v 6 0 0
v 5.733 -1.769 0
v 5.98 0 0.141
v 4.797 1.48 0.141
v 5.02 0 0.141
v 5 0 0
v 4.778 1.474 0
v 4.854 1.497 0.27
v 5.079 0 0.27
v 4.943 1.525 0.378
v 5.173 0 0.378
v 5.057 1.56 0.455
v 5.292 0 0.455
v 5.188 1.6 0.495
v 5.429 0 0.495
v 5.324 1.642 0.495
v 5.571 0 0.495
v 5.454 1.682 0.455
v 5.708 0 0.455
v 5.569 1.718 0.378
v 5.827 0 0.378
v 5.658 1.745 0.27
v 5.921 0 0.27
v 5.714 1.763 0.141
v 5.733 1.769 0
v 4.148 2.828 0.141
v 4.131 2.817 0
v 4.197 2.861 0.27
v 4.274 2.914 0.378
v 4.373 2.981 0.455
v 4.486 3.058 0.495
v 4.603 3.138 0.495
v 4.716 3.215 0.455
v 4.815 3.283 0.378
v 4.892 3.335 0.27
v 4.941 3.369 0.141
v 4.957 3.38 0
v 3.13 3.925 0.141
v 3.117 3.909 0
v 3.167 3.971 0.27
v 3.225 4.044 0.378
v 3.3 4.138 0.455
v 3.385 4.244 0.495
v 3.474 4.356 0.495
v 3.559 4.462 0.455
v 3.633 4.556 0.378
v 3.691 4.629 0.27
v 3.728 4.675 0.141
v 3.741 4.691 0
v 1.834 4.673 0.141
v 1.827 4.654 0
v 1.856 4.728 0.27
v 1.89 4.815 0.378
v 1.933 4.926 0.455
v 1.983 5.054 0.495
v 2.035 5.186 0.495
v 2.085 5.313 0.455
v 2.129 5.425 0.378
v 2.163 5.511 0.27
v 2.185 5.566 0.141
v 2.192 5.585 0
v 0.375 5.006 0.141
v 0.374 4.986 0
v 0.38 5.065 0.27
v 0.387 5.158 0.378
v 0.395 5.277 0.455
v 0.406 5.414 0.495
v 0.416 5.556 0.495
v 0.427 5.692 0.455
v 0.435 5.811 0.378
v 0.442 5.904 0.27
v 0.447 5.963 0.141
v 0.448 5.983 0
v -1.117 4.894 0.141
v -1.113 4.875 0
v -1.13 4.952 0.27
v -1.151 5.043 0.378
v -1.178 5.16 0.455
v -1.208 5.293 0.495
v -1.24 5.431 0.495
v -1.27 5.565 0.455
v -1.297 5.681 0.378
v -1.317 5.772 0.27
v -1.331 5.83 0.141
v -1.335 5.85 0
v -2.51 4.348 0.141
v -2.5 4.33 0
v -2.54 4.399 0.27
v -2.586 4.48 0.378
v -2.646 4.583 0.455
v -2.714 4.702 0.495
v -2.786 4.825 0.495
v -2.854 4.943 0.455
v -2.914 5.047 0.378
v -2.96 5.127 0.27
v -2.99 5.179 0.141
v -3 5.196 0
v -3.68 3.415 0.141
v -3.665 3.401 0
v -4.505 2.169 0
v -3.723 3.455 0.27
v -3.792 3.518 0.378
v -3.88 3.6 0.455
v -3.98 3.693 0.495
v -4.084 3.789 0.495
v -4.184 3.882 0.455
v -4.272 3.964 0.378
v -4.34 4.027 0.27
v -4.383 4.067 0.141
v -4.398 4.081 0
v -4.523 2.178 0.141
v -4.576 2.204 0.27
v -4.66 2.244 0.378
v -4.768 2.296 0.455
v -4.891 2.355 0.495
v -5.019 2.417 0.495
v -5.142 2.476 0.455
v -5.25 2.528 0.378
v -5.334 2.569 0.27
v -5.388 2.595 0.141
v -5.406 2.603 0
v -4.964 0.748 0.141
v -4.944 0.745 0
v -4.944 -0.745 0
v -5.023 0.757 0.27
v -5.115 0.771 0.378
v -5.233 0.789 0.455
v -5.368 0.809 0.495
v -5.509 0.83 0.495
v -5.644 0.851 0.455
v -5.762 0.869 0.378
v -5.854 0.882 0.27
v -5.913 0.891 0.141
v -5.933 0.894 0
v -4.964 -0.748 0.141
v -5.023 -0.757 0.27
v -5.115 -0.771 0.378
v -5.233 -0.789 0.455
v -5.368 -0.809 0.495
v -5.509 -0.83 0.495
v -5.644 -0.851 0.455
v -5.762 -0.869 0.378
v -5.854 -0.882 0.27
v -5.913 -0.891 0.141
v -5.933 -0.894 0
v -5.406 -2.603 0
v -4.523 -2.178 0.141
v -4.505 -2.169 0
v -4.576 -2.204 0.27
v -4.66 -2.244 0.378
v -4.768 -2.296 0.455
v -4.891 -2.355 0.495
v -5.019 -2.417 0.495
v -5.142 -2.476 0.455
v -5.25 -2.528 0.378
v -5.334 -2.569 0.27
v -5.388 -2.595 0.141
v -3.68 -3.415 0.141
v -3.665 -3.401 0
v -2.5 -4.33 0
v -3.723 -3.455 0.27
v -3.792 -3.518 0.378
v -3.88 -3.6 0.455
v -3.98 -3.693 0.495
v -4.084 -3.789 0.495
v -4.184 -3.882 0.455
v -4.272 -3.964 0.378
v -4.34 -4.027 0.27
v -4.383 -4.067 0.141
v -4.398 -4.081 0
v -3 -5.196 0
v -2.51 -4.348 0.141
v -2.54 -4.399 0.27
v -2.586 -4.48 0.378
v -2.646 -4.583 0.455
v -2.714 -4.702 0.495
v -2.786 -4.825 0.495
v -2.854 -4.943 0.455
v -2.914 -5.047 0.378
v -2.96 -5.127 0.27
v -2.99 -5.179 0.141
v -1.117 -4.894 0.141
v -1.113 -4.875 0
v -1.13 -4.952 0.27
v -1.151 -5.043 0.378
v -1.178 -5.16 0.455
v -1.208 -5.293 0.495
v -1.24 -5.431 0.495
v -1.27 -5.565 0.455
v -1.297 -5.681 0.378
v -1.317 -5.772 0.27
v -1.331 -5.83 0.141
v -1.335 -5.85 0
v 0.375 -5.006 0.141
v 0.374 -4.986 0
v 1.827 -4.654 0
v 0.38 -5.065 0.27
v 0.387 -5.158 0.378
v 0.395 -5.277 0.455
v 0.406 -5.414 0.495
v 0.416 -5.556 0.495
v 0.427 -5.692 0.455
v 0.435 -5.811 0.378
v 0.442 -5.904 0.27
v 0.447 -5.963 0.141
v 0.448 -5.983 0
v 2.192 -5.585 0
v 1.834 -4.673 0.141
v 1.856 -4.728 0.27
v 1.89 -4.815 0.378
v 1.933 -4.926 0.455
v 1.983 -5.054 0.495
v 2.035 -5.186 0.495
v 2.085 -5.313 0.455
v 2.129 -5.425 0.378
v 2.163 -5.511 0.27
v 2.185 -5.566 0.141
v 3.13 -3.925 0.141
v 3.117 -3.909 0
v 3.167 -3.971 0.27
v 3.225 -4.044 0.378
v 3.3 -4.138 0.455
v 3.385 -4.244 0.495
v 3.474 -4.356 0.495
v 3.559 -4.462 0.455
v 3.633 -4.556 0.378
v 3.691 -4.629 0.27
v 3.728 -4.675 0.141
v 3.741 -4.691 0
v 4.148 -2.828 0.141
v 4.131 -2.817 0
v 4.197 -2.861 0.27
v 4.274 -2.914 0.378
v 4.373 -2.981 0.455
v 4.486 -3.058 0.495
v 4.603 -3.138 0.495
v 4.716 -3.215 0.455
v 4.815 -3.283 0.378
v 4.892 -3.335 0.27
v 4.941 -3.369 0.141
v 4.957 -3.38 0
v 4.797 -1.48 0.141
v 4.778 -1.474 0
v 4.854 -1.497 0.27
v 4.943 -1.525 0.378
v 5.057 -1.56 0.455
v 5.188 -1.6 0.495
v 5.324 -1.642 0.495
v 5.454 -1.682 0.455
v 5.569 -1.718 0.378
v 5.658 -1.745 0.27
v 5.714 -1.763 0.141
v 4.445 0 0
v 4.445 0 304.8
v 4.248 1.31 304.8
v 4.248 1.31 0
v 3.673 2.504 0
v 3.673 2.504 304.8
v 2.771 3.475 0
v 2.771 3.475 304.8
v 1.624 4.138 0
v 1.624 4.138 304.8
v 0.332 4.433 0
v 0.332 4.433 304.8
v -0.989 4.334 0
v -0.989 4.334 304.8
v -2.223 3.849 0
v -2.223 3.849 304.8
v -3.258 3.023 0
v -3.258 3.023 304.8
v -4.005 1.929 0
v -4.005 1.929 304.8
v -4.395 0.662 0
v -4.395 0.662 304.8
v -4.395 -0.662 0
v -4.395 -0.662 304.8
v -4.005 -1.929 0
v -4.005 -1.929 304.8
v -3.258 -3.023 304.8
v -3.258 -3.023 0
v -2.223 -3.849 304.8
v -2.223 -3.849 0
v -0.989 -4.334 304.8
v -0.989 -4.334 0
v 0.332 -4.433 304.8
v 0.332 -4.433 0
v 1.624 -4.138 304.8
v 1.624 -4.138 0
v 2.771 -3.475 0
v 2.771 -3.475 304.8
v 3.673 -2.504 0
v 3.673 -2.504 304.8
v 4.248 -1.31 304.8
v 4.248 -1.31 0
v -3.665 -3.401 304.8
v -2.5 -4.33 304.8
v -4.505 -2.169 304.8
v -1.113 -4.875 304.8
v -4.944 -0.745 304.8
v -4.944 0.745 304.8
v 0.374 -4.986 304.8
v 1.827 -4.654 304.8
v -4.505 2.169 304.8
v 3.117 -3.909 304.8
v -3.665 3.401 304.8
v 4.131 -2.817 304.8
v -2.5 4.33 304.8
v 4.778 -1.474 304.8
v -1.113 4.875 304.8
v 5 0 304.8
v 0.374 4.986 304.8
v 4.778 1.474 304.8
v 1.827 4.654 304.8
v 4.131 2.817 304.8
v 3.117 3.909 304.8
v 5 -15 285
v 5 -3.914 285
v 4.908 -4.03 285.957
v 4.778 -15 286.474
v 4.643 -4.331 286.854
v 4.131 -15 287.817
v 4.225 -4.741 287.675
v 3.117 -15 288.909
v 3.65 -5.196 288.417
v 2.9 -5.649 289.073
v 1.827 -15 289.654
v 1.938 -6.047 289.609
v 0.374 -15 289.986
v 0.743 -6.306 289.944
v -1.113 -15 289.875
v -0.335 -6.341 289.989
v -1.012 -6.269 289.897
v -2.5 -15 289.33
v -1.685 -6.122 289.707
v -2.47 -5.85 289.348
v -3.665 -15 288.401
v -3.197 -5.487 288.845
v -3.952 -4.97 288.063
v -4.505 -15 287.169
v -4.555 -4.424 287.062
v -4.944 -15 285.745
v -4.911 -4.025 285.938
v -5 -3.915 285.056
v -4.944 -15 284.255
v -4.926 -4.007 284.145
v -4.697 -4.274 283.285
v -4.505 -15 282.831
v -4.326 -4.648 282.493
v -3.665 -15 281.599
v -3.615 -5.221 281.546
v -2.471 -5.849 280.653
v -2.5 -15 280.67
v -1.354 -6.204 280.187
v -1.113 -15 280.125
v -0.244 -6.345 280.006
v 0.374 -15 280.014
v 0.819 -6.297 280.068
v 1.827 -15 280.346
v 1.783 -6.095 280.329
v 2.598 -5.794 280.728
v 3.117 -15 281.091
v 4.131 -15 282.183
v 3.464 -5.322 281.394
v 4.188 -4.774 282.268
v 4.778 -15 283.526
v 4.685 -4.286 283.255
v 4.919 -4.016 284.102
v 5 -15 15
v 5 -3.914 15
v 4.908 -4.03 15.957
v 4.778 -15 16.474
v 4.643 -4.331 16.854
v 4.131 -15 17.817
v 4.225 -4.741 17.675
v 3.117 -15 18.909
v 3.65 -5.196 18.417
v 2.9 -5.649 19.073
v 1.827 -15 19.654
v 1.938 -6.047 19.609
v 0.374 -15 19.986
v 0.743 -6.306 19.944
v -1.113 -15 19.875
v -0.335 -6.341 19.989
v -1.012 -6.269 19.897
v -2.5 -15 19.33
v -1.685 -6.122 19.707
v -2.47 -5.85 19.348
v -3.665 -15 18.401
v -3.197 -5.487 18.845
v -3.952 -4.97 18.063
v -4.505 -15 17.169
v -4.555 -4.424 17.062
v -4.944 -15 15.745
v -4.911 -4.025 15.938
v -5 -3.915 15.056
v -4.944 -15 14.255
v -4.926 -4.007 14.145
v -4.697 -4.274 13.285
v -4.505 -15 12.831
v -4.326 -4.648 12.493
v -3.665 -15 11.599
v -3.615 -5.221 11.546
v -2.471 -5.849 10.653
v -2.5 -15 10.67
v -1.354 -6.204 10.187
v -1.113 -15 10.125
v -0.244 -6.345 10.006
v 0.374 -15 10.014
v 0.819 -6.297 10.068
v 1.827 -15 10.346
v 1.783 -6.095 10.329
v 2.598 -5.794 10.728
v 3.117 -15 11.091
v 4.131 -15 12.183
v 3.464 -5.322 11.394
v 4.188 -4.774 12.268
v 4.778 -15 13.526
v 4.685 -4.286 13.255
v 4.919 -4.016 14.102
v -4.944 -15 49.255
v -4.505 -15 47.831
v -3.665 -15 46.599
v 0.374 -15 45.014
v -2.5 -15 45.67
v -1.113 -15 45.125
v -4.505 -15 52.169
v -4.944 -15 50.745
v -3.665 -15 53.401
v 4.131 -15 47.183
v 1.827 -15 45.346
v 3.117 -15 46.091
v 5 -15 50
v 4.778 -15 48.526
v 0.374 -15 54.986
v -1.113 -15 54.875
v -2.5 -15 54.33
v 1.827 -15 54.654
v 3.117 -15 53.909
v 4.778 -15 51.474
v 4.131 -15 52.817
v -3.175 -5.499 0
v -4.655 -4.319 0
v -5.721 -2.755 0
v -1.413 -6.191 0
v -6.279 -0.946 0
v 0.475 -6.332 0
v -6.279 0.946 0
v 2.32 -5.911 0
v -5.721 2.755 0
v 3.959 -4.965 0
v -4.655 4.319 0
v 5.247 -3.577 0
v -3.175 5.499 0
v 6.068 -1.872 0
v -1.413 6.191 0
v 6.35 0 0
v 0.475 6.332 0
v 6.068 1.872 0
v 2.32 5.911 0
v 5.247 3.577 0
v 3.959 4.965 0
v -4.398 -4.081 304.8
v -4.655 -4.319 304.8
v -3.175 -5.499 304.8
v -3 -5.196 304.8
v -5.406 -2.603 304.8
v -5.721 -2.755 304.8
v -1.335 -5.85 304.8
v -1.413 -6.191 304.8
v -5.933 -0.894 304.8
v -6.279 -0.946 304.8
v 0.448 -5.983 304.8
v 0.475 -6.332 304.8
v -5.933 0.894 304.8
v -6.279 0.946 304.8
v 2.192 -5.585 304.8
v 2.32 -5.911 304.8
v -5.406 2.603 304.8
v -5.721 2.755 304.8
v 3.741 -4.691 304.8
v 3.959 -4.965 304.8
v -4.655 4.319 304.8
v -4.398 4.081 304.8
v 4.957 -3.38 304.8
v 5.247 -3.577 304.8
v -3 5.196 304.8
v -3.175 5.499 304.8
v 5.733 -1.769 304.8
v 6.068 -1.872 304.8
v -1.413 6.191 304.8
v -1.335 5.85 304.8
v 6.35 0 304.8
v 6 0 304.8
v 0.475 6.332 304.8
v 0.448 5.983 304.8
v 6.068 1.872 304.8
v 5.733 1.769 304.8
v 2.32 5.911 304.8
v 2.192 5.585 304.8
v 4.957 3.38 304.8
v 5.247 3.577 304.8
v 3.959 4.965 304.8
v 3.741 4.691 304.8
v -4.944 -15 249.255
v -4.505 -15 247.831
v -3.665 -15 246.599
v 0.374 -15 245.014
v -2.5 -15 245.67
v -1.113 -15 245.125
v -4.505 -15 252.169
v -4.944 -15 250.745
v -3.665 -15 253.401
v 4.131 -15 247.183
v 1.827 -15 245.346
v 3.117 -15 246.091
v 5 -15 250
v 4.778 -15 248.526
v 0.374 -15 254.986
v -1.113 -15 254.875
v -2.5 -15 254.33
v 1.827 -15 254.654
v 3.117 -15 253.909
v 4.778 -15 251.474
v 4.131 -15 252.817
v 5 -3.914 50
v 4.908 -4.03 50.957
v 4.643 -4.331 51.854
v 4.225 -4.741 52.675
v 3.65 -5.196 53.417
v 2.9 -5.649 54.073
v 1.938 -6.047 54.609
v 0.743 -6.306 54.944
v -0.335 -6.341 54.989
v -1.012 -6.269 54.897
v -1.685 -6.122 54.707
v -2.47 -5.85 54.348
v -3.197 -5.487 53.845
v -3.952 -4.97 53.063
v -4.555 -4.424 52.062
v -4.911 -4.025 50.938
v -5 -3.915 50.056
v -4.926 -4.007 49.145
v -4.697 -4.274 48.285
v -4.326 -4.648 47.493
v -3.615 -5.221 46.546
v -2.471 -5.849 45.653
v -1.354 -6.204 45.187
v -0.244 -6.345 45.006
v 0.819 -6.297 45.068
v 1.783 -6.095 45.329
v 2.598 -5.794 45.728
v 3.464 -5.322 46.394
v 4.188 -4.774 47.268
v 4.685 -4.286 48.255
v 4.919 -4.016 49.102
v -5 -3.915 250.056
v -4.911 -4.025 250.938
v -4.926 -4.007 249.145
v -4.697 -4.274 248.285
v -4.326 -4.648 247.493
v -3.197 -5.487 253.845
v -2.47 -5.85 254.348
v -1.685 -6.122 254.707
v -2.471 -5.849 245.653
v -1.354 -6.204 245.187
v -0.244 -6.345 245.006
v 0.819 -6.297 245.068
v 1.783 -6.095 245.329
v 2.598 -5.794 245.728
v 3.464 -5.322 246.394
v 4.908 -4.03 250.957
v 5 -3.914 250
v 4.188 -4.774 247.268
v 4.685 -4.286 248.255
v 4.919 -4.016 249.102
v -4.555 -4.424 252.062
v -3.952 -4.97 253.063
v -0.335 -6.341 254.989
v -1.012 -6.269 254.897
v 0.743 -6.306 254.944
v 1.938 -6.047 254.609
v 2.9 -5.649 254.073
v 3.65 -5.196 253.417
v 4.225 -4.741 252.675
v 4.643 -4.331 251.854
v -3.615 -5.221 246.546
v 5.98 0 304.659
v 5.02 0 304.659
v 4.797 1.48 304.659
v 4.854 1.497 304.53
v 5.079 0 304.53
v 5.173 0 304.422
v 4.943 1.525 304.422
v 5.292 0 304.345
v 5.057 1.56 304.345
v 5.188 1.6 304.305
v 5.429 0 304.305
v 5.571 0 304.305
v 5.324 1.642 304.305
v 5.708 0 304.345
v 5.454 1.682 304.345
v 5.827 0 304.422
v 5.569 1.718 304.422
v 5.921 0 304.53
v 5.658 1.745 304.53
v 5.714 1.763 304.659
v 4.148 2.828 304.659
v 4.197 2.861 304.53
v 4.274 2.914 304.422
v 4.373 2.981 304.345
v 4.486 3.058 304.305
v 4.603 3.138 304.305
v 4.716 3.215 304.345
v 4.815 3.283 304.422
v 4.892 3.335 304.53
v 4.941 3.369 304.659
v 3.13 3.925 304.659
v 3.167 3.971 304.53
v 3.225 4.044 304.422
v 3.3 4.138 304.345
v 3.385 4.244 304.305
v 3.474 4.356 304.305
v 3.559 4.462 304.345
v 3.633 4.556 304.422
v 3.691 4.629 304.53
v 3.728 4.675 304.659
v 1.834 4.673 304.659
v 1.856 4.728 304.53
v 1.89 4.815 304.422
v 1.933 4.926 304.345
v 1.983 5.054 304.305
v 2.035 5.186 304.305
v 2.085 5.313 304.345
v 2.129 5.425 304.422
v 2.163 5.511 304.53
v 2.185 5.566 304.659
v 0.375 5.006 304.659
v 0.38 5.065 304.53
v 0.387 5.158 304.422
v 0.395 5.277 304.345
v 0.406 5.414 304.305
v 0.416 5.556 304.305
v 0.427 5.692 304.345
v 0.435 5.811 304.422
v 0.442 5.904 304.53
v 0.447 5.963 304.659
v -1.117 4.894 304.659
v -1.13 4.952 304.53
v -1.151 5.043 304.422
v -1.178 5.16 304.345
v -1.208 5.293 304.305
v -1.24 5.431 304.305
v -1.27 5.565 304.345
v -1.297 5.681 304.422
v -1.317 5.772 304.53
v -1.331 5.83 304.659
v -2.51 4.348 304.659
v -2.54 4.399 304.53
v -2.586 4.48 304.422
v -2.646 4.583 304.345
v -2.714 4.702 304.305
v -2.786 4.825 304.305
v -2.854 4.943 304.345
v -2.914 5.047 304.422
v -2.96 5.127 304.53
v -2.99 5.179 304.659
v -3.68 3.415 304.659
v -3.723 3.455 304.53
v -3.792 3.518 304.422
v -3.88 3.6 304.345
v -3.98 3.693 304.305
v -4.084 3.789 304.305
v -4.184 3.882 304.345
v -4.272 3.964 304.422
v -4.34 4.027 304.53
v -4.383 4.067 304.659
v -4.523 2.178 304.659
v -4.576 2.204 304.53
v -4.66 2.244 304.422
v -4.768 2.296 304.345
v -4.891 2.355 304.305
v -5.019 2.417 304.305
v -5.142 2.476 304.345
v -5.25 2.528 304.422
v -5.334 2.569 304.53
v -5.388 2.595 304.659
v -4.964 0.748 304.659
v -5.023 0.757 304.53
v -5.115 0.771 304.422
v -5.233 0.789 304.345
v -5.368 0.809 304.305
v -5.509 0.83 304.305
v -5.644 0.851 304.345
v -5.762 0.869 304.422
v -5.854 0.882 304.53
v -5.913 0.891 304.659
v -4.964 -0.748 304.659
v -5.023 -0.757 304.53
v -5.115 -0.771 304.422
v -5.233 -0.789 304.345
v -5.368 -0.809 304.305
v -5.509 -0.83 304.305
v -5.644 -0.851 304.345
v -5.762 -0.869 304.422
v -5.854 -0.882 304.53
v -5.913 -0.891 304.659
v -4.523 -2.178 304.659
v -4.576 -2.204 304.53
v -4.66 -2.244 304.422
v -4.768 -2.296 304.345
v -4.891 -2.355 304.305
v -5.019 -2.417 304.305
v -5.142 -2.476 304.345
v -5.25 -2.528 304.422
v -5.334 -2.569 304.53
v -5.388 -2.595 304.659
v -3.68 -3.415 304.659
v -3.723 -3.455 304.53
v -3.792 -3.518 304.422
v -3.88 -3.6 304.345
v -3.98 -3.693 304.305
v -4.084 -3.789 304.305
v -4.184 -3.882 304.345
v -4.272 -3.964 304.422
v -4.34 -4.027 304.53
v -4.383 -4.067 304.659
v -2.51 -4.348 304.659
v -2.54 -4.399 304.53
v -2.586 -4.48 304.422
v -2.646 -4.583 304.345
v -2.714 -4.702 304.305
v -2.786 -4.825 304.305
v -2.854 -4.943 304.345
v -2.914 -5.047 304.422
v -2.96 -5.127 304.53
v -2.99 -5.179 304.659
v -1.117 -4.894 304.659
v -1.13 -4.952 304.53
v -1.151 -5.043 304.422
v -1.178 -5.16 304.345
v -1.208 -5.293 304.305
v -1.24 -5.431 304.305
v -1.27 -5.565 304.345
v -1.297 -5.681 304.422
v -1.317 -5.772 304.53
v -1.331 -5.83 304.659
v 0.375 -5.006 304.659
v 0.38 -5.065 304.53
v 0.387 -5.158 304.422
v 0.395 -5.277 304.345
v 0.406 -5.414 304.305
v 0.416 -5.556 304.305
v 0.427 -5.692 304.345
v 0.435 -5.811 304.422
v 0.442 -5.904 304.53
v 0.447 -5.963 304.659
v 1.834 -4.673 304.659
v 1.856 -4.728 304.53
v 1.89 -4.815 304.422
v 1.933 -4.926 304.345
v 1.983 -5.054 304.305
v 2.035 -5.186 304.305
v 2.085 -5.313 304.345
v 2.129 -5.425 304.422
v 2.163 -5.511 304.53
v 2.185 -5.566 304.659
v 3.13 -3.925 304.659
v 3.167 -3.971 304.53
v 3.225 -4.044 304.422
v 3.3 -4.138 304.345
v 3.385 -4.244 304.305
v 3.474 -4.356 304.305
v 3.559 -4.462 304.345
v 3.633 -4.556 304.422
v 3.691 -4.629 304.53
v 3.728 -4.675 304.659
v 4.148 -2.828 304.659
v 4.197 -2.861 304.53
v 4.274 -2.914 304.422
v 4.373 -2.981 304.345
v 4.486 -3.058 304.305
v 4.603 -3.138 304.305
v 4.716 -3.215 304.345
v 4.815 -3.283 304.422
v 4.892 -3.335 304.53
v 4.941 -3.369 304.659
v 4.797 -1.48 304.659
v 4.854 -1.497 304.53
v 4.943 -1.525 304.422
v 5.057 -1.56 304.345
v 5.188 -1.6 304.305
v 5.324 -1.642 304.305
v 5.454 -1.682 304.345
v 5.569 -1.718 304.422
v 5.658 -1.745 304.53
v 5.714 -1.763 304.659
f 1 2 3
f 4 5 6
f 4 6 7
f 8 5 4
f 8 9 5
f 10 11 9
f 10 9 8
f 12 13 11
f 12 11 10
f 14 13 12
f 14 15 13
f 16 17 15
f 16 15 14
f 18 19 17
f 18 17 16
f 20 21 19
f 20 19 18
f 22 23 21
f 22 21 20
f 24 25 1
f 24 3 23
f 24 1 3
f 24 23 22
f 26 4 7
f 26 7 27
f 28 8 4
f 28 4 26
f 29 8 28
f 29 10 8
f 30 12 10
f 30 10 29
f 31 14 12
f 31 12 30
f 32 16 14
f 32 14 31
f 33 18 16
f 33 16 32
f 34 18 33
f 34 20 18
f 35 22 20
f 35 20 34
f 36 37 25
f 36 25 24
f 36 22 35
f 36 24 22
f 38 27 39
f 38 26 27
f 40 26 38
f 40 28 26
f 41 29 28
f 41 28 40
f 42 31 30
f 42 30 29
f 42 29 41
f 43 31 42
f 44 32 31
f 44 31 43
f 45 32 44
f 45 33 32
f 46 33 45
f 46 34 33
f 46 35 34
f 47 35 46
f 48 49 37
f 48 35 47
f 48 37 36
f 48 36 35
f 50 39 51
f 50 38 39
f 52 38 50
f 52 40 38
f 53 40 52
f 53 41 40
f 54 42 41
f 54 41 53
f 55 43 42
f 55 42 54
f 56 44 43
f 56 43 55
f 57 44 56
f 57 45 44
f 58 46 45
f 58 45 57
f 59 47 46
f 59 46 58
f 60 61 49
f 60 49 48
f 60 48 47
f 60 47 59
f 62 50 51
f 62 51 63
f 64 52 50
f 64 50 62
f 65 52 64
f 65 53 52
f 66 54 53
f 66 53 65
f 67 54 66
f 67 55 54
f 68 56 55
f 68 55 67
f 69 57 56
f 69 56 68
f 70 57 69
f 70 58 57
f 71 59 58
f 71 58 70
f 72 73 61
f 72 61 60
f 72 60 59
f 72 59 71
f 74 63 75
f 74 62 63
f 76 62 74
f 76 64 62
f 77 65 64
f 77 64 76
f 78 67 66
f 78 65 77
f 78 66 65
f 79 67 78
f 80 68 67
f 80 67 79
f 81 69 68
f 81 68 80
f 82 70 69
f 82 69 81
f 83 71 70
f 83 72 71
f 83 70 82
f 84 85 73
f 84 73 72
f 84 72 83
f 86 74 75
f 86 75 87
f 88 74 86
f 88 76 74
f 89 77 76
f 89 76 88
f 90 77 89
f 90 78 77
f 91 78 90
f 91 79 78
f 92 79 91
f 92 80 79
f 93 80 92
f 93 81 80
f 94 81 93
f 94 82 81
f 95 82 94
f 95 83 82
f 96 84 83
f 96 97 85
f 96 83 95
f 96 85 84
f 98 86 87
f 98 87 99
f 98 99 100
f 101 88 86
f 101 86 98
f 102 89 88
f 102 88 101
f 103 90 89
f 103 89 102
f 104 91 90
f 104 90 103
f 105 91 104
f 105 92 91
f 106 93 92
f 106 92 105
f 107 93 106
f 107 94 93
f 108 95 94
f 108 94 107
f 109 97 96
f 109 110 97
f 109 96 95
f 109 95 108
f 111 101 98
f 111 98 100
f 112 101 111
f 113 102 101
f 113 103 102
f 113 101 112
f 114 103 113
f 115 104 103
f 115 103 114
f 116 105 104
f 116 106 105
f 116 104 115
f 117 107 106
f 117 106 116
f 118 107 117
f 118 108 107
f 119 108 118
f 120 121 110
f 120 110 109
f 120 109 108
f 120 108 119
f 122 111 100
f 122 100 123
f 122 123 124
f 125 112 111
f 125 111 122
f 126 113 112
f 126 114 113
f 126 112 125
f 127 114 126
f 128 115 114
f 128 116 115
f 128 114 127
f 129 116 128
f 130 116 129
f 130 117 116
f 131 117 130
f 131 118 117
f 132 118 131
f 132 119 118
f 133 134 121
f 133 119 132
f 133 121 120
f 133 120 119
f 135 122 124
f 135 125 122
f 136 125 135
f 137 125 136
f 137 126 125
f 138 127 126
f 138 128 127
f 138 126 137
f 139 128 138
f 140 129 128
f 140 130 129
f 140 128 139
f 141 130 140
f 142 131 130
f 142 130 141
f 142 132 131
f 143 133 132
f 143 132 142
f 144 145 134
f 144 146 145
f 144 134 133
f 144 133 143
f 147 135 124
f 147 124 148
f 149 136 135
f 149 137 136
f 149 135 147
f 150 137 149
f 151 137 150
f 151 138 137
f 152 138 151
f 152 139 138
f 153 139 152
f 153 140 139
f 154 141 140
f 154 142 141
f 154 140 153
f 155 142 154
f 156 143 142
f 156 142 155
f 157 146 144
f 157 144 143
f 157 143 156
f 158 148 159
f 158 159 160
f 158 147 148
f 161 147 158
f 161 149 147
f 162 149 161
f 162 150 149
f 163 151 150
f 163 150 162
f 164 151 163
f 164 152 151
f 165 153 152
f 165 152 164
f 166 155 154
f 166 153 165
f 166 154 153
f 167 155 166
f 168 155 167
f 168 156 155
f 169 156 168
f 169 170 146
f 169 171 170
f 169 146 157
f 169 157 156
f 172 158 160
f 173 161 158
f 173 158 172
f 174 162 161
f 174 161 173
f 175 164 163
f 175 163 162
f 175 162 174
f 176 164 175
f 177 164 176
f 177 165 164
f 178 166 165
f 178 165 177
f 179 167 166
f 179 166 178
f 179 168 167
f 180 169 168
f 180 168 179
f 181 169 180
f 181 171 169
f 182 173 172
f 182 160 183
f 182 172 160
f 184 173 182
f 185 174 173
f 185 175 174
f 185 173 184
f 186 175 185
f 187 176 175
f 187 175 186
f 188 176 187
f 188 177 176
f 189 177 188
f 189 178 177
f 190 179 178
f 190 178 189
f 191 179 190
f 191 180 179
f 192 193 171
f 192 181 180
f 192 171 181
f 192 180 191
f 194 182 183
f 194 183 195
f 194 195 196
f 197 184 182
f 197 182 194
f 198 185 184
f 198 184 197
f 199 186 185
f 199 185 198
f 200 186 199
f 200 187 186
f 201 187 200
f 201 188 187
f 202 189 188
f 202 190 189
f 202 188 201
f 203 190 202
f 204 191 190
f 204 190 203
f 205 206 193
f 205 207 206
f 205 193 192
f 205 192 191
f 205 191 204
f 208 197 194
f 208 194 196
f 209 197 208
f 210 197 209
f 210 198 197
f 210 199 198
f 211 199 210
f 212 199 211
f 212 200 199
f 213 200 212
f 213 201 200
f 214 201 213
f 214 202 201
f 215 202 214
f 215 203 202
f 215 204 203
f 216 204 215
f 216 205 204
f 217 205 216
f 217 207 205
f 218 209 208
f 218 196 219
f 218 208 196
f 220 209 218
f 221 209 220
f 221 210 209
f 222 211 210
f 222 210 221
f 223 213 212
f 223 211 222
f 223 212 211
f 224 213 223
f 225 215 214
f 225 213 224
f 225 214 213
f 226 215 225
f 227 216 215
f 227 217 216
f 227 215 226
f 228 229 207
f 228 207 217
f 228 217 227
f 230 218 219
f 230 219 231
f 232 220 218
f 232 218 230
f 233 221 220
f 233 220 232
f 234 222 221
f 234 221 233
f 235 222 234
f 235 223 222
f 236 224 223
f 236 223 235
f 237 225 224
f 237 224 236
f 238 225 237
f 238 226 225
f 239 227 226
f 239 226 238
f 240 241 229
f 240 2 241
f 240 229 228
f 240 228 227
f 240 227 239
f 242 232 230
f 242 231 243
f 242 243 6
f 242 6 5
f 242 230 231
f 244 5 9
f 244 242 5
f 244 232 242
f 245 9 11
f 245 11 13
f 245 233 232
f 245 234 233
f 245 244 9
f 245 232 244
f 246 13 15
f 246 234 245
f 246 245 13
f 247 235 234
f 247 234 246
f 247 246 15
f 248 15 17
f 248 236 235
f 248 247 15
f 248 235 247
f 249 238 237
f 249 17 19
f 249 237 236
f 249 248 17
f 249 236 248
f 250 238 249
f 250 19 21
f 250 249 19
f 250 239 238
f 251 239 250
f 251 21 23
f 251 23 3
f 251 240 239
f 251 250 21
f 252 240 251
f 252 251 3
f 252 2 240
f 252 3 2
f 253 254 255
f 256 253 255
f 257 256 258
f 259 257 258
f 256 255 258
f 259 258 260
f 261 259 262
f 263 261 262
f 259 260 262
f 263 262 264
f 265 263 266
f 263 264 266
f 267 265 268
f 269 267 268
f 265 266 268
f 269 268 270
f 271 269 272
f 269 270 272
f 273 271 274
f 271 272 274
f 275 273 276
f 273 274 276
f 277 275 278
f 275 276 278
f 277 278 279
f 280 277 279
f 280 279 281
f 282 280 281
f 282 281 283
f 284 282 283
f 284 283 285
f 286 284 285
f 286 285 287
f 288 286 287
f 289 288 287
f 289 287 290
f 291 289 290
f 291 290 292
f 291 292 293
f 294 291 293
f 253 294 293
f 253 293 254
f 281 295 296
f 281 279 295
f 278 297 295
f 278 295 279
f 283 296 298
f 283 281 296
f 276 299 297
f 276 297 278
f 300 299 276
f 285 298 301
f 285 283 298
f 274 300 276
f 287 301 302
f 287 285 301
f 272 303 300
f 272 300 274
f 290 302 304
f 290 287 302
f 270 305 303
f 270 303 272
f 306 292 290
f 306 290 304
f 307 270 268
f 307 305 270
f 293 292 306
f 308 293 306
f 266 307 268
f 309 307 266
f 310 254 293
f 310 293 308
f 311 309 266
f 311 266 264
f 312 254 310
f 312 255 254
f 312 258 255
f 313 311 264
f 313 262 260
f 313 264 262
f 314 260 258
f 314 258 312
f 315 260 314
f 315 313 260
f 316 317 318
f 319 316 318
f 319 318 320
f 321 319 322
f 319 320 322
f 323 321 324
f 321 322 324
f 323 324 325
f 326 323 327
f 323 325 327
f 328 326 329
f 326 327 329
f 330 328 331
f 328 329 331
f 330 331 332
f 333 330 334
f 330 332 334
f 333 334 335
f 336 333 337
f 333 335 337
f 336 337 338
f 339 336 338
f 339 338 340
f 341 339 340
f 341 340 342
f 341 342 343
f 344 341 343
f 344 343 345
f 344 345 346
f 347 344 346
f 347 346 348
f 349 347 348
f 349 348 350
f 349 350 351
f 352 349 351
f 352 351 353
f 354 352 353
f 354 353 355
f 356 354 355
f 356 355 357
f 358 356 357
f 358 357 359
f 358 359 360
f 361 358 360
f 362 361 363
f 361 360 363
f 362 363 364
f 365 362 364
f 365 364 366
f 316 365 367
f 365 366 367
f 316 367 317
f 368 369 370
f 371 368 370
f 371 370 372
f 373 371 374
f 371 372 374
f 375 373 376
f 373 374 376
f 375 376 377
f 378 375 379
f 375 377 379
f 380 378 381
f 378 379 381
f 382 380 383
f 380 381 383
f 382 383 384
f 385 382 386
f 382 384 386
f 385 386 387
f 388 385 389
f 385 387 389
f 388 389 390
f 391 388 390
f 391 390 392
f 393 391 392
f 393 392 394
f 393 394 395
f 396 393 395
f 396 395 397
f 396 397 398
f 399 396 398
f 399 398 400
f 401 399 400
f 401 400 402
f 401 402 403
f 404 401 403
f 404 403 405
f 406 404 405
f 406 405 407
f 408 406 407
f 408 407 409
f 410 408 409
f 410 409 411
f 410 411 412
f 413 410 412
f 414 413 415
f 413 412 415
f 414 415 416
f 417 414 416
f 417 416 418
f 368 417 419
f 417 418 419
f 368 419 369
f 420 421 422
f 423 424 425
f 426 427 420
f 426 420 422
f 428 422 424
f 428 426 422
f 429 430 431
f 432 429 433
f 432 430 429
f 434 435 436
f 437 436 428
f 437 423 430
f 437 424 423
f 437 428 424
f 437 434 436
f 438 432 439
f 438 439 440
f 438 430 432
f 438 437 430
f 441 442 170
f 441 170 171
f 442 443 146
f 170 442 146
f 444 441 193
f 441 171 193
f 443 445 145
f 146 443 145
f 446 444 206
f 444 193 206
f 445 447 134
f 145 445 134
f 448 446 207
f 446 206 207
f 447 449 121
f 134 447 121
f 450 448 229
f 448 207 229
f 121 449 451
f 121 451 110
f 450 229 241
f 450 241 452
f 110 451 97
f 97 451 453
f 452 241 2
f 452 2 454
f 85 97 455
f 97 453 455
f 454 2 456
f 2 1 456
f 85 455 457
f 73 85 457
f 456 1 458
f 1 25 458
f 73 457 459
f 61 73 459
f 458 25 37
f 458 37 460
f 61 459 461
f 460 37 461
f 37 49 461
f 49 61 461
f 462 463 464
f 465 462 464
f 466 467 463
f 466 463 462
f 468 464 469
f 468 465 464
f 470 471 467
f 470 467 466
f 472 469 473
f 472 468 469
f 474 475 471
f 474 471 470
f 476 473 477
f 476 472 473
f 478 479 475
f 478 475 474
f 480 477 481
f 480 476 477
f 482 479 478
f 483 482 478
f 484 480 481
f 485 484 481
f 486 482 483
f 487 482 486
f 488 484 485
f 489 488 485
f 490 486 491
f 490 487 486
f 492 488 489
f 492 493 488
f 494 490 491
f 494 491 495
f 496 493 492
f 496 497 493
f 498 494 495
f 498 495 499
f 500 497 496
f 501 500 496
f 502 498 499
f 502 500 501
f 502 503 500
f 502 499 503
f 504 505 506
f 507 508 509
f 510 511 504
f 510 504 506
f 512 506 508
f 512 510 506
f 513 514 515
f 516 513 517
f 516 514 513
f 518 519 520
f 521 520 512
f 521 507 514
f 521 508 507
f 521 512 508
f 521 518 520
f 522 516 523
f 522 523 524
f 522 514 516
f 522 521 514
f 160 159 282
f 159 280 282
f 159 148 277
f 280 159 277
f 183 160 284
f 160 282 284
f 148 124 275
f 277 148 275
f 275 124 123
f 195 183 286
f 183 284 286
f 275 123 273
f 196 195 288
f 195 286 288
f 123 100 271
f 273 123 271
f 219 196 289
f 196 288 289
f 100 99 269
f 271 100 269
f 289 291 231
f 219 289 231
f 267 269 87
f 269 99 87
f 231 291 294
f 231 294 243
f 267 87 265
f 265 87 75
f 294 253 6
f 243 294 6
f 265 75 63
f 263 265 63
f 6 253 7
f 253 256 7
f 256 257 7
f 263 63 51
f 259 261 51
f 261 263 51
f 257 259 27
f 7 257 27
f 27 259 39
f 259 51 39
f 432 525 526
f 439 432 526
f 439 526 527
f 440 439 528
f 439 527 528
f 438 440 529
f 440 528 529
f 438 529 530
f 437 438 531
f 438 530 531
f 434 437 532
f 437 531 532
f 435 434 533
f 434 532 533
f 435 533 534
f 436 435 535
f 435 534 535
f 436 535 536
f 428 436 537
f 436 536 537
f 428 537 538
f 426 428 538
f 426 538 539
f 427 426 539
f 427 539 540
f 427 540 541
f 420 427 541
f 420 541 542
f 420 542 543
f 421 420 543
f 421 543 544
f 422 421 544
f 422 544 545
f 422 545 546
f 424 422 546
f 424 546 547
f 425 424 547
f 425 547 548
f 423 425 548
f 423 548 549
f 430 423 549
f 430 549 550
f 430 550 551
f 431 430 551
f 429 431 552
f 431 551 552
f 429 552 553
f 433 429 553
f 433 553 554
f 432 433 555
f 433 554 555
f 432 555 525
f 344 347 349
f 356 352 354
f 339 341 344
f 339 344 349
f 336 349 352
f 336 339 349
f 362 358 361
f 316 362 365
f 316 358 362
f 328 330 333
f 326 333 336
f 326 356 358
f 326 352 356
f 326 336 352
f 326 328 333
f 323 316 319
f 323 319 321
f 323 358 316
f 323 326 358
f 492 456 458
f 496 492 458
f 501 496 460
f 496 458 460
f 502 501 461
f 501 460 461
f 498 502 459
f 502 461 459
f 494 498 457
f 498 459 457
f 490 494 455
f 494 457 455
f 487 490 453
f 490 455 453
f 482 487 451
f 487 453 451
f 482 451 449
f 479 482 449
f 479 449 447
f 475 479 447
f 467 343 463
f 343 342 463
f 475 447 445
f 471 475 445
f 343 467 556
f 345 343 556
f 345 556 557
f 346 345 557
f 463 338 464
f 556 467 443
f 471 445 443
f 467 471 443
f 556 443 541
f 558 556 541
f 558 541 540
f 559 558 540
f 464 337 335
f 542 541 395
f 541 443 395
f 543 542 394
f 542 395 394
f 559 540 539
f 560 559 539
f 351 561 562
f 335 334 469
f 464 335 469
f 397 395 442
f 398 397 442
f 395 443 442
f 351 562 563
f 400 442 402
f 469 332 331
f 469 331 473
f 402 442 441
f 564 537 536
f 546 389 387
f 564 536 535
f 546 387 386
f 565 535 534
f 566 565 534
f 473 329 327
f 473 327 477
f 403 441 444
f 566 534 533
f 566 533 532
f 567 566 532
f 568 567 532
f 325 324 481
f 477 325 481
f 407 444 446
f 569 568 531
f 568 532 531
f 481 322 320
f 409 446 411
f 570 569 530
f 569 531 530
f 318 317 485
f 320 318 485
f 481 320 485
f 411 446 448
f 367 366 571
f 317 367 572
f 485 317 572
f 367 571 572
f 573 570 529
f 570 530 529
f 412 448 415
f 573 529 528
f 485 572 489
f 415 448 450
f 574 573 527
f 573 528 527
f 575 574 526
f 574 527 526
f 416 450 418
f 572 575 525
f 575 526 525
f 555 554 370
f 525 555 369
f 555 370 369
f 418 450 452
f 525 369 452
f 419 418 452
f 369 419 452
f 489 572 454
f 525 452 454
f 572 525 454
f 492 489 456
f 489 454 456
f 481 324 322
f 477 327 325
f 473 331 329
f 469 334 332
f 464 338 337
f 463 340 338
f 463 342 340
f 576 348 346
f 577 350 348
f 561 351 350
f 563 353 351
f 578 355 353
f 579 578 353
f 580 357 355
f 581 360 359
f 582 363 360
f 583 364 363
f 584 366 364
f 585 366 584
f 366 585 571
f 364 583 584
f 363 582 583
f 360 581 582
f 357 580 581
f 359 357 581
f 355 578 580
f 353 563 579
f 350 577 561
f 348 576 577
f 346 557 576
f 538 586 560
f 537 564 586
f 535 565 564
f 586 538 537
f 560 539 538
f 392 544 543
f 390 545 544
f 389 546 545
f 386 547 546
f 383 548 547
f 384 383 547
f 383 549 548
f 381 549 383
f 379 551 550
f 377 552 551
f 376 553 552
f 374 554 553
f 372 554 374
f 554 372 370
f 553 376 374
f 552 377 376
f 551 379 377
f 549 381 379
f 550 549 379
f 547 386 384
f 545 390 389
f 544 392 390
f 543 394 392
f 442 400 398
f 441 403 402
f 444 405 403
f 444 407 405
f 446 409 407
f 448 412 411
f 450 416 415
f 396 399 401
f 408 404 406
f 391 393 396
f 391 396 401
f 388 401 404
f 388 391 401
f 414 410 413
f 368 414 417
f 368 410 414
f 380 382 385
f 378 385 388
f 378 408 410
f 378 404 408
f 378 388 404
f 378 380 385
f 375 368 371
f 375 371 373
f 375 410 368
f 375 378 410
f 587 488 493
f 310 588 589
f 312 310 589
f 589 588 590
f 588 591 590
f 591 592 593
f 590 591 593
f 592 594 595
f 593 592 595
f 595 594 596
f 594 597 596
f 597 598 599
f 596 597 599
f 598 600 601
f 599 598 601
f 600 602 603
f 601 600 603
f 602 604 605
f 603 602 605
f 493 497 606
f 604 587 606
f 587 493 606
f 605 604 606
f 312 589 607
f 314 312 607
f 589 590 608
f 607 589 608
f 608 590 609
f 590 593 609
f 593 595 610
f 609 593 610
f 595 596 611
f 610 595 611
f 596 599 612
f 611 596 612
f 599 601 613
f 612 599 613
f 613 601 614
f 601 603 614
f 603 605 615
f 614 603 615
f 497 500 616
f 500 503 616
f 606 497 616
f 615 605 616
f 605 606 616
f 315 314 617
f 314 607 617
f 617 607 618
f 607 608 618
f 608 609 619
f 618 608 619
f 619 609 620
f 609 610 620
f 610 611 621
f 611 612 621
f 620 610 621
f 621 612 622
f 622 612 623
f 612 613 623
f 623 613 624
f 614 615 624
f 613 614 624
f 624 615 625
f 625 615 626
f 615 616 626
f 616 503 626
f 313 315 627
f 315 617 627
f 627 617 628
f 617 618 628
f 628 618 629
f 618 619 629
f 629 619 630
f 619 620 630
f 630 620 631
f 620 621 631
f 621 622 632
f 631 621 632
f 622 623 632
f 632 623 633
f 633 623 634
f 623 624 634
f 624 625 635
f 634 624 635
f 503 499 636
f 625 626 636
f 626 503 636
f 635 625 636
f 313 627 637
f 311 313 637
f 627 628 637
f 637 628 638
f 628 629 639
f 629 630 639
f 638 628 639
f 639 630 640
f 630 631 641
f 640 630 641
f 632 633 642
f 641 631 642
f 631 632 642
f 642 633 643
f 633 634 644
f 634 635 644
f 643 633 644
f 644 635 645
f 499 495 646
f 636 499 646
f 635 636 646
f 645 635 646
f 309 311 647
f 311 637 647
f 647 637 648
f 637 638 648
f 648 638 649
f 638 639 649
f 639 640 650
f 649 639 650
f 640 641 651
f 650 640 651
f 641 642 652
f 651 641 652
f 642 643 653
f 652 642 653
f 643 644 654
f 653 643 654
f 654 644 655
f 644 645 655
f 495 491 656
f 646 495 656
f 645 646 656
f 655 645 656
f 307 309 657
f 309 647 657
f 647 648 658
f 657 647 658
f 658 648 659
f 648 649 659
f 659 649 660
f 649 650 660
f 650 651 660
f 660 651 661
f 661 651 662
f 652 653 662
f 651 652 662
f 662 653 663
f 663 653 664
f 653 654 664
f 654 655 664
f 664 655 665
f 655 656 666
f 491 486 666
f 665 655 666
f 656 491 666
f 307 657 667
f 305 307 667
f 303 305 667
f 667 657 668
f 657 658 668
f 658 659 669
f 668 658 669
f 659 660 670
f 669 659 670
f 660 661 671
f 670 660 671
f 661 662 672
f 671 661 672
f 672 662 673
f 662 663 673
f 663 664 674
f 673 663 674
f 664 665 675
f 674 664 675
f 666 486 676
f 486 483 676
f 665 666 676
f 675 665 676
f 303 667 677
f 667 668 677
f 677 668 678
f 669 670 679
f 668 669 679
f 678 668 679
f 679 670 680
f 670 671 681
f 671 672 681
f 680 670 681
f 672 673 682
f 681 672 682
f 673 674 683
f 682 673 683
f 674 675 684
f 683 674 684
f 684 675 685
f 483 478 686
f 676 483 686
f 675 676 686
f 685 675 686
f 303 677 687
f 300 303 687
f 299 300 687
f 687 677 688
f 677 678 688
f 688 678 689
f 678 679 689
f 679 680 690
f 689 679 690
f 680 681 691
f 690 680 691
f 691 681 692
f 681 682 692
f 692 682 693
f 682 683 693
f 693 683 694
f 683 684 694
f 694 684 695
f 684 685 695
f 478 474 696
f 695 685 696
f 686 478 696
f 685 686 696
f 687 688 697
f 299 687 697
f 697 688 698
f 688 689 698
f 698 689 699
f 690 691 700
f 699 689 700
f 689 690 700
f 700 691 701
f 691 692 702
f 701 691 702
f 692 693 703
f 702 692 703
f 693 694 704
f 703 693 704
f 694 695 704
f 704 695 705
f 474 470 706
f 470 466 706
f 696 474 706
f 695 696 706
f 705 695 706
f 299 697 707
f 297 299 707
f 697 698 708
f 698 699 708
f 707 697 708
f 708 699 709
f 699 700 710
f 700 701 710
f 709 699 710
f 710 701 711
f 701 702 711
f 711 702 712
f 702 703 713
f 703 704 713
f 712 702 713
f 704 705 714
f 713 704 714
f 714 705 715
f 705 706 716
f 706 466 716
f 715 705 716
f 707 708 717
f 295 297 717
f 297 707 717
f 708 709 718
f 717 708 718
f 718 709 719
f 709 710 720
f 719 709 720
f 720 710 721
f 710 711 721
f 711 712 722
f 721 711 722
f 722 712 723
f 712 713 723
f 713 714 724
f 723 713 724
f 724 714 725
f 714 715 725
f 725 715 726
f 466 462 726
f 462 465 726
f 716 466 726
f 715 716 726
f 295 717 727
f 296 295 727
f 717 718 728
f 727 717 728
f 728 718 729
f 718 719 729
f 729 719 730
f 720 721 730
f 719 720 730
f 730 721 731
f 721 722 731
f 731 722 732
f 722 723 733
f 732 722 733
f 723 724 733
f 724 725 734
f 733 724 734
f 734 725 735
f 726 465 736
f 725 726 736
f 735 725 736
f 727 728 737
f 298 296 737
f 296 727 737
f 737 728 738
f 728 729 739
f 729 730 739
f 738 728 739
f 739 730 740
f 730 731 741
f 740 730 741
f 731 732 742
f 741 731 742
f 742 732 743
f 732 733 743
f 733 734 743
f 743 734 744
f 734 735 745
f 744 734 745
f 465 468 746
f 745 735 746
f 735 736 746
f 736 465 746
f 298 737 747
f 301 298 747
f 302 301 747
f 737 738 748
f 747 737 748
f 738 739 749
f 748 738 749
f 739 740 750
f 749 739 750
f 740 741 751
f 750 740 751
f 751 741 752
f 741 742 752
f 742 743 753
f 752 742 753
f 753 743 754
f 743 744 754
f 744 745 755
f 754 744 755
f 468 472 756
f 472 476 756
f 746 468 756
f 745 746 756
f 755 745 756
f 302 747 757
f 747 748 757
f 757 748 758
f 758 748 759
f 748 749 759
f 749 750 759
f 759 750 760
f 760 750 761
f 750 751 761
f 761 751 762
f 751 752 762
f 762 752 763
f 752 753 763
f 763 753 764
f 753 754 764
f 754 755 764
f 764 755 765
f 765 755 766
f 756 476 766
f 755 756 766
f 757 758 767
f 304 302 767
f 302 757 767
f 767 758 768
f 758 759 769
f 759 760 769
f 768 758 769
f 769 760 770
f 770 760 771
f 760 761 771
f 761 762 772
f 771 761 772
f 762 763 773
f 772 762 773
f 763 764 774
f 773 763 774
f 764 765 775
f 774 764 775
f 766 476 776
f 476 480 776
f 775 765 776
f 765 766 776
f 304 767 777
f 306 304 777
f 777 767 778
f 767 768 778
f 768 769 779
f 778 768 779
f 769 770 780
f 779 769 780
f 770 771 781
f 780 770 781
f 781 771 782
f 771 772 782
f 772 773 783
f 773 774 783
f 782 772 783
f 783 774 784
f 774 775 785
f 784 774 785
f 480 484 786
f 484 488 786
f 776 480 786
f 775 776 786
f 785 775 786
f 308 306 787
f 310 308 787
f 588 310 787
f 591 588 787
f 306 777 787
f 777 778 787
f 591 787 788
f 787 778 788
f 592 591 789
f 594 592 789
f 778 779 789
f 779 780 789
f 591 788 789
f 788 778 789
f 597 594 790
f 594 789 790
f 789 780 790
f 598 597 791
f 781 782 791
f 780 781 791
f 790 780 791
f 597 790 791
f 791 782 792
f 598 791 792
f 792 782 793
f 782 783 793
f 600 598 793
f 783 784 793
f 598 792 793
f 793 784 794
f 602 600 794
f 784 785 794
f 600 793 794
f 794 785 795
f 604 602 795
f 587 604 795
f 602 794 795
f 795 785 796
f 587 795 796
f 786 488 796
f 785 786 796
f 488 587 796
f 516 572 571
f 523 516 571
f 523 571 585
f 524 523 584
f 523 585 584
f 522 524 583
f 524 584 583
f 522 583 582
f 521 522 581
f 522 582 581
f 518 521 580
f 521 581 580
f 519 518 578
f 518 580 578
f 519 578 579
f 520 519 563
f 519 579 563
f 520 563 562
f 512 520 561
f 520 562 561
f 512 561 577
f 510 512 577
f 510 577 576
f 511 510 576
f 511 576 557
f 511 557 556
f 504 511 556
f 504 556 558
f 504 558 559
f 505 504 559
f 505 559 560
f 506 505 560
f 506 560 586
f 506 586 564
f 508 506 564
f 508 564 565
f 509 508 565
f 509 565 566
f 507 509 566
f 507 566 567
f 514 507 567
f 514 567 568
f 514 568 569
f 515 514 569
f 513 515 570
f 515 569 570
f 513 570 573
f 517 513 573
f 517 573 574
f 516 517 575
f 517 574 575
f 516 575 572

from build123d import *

# Parameters (mm, degrees)
F0_R     = 6.35
F1_DEPTH = 304.8
F2_R     = 5
F4_DEPTH = 15
F3_R     = 4.445
F5_DEPTH = 304.8010001


# Not quite as in the source:
# - a pattern or mirror of a feature is missing from the dataset's text; its kind, count and spacing are read off the source's solid


with BuildPart() as f1:
    # F0 (on Top) → F1 (new body)
    with BuildSketch(Plane.XY):
        Circle(F0_R)
    extrude(amount=F1_DEPTH)

    # F2 (on Front) → F4 (join)
    with BuildSketch(Plane.XZ):
        with Locations((0, 15)):
            Circle(F2_R)
        with Locations((0, 50)):
            Circle(F2_R)
        with Locations((0, 250)):
            Circle(F2_R)
        with Locations((0, 285)):
            Circle(F2_R)
    extrude(amount=F4_DEPTH)

    # F3 (on face) → F5 (cut, through all)
    with BuildSketch(Plane.XY.offset(304.8)):
        Circle(F3_R)
    extrude(amount=-F5_DEPTH, mode=Mode.SUBTRACT)

    # F8: sweep along a path in F6
    with BuildLine(Plane.XY.offset(304.8)) as f8_path:
        CenterArc((0, 0), 5.461, 0, 360)
    # F7 (on Front) → F8 (sweep, cut)
    with BuildSketch(Plane.XZ):
        with BuildLine():
            Line((-5, 304.8), (-6, 304.8))
            ThreePointArc((-6, 304.8), (-5.5, 304.3), (-5, 304.8))
        make_face()
    f8 = sweep(path=f8_path.line, mode=Mode.SUBTRACT)

    # F8_copies: F8 across plane
    add(f8.mirror(Plane(origin=(0, 0, 152.4), x_dir=(-1, 0, 0), z_dir=(0, 0, -1))), mode=Mode.SUBTRACT)


solid = f1.part
